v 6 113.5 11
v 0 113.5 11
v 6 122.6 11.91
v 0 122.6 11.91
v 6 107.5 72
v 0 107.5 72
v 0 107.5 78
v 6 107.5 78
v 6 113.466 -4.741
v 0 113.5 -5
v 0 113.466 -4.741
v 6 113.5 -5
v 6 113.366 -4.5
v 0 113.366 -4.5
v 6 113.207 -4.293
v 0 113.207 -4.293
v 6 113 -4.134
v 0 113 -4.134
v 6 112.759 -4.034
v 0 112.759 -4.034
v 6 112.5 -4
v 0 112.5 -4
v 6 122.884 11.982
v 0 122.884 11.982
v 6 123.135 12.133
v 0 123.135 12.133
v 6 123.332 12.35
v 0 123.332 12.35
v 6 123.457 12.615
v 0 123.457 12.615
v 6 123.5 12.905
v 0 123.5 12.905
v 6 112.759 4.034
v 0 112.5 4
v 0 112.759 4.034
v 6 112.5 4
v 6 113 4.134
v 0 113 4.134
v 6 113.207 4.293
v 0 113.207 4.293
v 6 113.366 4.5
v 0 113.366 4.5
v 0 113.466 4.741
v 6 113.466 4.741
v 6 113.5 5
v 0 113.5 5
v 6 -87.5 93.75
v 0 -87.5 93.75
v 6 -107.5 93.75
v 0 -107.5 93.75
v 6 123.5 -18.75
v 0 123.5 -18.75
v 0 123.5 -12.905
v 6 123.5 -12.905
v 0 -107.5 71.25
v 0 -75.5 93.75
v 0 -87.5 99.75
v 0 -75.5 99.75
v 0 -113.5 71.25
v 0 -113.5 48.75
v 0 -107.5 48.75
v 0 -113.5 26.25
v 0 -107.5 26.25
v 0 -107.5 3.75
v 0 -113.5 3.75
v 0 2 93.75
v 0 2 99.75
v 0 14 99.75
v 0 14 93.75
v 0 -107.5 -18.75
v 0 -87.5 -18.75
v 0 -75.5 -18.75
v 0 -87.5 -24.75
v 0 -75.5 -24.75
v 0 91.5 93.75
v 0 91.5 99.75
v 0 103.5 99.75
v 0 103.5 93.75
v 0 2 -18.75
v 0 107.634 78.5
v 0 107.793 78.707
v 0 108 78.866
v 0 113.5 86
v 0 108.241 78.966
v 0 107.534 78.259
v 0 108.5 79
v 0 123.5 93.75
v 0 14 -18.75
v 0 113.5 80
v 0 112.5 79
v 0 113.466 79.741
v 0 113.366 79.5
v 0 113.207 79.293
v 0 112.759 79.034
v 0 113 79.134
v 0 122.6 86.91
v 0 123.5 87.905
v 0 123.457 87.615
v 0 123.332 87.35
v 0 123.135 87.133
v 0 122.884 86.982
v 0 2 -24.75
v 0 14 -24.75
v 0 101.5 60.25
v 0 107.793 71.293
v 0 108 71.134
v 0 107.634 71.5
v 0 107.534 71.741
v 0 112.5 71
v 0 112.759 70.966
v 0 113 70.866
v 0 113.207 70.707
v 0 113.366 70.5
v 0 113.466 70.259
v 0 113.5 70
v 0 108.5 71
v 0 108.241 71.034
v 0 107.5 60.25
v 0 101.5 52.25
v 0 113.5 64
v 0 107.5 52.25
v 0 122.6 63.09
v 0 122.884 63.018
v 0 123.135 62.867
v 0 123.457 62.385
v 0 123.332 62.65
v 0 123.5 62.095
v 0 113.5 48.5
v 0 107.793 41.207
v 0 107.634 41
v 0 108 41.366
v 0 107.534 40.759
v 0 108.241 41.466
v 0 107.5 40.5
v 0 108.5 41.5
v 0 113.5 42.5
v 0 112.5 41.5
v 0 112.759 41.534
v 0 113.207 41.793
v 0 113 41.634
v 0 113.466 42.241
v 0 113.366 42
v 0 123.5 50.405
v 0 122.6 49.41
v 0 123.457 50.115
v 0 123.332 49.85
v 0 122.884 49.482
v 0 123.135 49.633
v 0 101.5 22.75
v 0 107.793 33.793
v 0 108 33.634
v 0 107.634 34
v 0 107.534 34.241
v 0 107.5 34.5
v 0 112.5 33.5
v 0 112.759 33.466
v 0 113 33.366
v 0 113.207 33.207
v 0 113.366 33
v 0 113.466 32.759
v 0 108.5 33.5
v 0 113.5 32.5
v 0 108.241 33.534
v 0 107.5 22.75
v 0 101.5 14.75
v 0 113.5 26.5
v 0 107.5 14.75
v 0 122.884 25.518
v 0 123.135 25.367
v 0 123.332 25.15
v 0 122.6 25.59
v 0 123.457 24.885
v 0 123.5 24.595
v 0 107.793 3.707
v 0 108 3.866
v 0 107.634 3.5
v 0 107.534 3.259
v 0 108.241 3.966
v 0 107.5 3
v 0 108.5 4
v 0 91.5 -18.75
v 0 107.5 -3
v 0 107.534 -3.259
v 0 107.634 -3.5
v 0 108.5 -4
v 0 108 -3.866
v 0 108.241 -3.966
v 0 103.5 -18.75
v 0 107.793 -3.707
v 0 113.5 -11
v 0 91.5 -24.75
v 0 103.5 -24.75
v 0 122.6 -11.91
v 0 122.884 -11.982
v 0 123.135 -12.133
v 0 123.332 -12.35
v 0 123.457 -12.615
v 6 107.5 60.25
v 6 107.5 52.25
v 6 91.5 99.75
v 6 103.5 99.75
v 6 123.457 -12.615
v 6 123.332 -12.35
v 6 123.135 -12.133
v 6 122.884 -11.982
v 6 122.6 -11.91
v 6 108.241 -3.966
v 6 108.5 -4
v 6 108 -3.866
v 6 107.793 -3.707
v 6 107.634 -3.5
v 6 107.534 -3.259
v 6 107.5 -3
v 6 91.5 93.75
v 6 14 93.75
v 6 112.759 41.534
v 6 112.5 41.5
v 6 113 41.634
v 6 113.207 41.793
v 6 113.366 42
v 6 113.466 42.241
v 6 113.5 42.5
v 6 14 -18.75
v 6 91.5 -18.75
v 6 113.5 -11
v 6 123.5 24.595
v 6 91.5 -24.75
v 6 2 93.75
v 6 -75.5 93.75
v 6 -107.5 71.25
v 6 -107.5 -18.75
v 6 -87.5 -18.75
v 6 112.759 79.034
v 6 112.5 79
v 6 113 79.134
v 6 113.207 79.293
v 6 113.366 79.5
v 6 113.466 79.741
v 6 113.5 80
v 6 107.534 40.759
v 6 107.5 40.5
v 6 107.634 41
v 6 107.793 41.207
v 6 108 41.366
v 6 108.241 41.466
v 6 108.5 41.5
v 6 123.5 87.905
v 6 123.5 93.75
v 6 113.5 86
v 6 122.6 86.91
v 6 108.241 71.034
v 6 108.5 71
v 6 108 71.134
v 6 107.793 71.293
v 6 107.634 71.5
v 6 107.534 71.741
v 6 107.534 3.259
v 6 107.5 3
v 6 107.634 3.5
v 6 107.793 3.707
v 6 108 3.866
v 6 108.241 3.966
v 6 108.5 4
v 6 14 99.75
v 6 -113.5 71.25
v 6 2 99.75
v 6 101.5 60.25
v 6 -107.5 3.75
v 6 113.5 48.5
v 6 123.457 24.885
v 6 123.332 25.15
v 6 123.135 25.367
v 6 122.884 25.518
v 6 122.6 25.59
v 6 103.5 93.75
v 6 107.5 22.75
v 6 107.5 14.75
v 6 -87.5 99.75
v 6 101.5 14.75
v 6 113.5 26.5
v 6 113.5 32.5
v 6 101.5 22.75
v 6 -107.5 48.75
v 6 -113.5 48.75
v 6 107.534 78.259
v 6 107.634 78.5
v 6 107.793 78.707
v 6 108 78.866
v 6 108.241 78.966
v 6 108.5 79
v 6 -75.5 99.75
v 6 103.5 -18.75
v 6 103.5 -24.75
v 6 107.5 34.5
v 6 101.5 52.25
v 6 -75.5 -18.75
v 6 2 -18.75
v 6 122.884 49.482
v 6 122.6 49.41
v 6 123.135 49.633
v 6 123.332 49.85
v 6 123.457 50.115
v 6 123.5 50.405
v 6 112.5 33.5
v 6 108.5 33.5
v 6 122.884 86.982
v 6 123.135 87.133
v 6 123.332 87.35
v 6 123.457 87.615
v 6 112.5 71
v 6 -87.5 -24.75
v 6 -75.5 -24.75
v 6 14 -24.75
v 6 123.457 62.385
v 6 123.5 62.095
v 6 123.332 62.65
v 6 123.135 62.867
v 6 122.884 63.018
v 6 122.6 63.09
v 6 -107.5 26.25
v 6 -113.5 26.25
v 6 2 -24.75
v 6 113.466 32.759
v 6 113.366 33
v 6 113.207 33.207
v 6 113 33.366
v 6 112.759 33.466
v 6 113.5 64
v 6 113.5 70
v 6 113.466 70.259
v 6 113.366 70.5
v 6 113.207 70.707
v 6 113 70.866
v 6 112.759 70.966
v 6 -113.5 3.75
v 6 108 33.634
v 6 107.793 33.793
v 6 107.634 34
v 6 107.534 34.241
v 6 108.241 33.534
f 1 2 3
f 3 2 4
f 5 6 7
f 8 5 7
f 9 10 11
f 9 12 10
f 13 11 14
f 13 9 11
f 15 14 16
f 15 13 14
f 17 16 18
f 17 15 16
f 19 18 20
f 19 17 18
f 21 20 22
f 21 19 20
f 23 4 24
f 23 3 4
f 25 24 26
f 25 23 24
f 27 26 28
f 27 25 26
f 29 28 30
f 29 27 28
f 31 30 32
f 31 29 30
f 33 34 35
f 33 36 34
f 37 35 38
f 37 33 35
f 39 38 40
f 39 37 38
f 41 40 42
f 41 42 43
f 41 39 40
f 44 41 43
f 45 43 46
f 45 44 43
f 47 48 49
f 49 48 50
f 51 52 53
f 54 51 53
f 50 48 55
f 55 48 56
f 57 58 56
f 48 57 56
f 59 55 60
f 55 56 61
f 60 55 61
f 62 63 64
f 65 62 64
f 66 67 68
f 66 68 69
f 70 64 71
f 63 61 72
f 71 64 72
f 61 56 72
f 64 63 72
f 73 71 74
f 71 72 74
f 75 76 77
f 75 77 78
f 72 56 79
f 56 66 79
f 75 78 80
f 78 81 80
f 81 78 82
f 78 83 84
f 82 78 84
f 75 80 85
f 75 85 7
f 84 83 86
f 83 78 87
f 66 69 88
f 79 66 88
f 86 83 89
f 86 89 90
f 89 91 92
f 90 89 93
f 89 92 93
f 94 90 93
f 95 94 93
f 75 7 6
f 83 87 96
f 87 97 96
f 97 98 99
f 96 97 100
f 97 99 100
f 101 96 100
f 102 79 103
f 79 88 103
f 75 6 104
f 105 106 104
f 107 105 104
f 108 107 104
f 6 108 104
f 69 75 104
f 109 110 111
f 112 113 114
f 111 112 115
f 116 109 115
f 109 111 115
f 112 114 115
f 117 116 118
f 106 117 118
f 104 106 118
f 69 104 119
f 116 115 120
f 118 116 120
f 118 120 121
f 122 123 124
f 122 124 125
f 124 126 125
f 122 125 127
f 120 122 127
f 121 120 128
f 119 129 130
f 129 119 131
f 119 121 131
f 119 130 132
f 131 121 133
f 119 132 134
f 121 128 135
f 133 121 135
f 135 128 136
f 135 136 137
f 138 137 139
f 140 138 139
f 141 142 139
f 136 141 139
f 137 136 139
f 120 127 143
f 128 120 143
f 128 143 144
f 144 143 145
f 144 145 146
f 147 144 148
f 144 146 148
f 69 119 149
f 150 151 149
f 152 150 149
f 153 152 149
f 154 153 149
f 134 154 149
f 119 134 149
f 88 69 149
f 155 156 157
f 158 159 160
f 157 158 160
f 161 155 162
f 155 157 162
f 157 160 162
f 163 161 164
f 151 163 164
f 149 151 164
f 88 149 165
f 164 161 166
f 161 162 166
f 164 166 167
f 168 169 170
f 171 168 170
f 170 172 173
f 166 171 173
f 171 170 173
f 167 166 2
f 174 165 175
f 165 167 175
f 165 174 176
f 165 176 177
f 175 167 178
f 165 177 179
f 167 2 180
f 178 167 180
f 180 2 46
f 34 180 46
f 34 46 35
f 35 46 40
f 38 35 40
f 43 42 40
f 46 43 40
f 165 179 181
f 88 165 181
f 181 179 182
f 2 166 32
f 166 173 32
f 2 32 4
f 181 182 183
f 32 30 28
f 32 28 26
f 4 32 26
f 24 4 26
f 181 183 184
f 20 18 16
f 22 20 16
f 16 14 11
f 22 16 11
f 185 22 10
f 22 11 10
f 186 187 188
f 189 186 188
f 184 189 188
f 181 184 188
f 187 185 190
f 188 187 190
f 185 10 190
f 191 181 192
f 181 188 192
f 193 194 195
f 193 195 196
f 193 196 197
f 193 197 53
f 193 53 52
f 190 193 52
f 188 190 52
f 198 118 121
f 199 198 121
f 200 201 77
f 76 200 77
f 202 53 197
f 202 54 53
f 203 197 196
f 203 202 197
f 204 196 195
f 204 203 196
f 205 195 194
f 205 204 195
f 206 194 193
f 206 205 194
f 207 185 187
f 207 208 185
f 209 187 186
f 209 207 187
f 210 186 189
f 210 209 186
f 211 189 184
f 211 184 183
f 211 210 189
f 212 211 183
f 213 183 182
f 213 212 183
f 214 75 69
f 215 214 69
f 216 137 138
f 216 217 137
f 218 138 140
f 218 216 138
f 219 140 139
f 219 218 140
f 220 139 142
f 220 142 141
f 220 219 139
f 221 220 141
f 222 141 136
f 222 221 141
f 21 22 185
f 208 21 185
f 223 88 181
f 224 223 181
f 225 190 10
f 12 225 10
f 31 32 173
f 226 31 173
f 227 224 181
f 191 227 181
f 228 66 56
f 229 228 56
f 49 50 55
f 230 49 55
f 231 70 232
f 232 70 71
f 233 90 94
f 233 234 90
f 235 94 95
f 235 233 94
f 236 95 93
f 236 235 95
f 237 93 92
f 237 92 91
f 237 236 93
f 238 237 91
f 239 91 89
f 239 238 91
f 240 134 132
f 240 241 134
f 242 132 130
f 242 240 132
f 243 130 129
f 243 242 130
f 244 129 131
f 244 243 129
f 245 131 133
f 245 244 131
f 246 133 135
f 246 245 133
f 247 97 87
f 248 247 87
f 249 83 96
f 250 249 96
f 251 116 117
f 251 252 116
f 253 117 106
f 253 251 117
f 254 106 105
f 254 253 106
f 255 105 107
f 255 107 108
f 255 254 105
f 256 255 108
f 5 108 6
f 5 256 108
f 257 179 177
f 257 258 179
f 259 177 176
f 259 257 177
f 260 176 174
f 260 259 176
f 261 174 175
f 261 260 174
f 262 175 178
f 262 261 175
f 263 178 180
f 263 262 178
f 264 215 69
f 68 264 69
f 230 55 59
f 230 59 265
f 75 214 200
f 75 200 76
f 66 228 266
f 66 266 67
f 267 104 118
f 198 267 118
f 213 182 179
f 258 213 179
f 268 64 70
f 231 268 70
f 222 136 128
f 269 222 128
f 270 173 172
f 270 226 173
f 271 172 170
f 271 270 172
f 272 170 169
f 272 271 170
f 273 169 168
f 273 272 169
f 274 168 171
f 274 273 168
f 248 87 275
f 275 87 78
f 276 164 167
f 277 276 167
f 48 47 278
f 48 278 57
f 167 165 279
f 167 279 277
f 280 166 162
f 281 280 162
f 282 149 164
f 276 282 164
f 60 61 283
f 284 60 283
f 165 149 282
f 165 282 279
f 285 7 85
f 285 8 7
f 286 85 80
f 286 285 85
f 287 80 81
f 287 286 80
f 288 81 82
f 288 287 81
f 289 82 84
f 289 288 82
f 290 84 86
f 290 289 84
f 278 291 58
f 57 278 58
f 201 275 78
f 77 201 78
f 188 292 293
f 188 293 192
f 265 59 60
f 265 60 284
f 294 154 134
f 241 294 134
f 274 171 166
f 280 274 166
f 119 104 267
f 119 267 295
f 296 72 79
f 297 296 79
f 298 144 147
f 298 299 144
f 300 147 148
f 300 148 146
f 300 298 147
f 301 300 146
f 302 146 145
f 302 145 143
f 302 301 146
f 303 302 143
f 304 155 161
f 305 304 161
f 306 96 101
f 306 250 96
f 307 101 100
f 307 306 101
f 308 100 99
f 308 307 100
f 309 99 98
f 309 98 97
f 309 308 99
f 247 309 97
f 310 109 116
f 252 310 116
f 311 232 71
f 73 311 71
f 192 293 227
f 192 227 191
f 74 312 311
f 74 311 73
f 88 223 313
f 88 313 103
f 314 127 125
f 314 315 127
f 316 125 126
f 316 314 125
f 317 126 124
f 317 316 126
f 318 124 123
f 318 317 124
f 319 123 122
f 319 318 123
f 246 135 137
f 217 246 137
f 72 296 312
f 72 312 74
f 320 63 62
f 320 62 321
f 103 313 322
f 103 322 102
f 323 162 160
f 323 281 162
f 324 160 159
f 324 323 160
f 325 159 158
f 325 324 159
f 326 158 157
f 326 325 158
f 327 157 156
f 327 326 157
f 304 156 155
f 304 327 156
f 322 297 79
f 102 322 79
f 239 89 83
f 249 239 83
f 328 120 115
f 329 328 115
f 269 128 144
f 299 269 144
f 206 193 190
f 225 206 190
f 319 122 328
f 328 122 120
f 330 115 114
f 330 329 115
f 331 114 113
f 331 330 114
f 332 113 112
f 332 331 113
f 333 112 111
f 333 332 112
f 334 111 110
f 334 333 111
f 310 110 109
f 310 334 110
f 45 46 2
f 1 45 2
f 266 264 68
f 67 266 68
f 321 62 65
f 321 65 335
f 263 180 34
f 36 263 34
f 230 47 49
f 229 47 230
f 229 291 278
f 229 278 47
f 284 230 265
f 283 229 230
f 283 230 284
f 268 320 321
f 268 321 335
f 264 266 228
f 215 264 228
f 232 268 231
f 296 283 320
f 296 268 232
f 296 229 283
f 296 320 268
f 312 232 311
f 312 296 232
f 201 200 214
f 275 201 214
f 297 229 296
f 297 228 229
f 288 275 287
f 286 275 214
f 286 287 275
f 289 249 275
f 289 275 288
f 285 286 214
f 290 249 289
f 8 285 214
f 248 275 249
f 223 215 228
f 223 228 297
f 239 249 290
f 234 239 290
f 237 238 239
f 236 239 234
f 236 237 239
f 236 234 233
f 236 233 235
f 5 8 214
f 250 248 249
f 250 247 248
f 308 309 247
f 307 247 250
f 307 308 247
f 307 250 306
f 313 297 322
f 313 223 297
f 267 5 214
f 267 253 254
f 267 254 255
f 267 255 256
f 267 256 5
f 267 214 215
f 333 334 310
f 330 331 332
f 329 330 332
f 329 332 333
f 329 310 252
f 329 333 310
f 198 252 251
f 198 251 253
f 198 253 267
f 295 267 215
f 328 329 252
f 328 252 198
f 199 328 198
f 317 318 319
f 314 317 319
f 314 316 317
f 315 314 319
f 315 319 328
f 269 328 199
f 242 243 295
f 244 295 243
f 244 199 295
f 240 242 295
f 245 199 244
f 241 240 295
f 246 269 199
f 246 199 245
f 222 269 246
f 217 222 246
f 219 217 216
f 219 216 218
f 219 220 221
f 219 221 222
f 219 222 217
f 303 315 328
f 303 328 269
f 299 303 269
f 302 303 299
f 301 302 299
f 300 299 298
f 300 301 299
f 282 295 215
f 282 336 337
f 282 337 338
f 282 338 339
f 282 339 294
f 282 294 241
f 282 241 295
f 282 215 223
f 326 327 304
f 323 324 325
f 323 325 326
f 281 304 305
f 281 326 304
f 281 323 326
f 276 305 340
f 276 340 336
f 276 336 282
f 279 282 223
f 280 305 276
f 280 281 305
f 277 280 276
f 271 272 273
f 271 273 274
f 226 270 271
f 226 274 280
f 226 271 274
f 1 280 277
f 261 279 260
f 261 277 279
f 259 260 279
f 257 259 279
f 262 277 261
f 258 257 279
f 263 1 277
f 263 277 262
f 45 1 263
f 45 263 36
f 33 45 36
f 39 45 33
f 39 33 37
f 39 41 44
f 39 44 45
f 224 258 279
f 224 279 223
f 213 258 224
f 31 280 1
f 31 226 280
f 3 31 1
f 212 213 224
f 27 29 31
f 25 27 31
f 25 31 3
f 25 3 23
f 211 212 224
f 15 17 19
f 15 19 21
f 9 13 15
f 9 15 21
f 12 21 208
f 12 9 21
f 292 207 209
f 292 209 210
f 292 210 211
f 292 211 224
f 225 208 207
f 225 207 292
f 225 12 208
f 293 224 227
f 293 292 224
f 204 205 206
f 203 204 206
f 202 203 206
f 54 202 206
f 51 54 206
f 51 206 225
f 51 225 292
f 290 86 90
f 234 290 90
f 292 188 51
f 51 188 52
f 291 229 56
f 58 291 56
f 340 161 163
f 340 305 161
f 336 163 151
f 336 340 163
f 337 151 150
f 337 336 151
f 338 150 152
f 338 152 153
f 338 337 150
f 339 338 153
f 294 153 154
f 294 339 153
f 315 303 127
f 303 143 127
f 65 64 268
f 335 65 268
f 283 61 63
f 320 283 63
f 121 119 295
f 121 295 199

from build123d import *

# Parameters (mm, degrees)
BOSS_EXTRUDE2_DEPTH    = 6
FILLET1_R              = 1
LPATTERN1_COUNT        = 3
LPATTERN1_PITCH        = 37.5
FILLET1_OF_LPATTERN1_R = 1
SKETCH3_W              = 6
SKETCH3_H              = 12
BOSS_EXTRUDE3_DEPTH    = 6
SKETCH4_W              = 8
SKETCH4_H              = 6
CUT_EXTRUDE2_DEPTH     = 7
LPATTERN2_COUNT        = 2
LPATTERN2_PITCH        = 37.5
BOSS_EXTRUDE4_START    = -112.5
SKETCH3_2_W            = 6
SKETCH3_2_H            = 12
BOSS_EXTRUDE4_DEPTH    = 6
SKETCH5_W              = 6
SKETCH5_H              = 22.5
BOSS_EXTRUDE5_DEPTH    = 6


with BuildPart() as part:
    # Sketch2 → Boss-Extrude2 (new body)
    with BuildSketch(Plane(origin=(0, 0, 0), x_dir=(0, 0, -1), z_dir=(1, 0, 0))):
        Polygon((-18.75, 123.5), (-18.75, 107.5), (-18.75, -107.5), (18.75, -107.5), (18.75, 107.5), (18.75, 123.5), (12, 123.5), (11, 113.5), (4, 113.5), (4, 107.5), (-4, 107.5), (-4, 113.5), (-11, 113.5), (-12, 123.5), align=None)
    boss_extrude2 = extrude(amount=BOSS_EXTRUDE2_DEPTH)

    # Fillet1
    fillet1_edges = [part.edges().sort_by_distance(p)[0] for p in [
        (3, 113.5, -4),
        (3, 123.5, -12),
        (3, 123.5, 12),
        (3, 113.5, 4),
        (3, 107.5, 4),
        (3, 107.5, -4),
    ]]
    fillet(fillet1_edges, radius=FILLET1_R)

    # LPattern1: Boss-Extrude2 ×3
    with Locations(*[(0, 0, i * LPATTERN1_PITCH) for i in range(1, LPATTERN1_COUNT)]):
        add(boss_extrude2)

    # Fillet1 of LPattern1
    fillet1_of_lpattern1_edges = [part.edges().sort_by_distance(p)[0] for p in [
        (3, 113.5, 33.5),
        (3, 123.5, 25.5),
        (3, 123.5, 49.5),
        (3, 113.5, 41.5),
        (3, 107.5, 41.5),
        (3, 107.5, 33.5),
        (3, 113.5, 71),
        (3, 123.5, 63),
        (3, 123.5, 87),
        (3, 113.5, 79),
        (3, 107.5, 79),
        (3, 107.5, 71),
    ]]
    fillet(fillet1_of_lpattern1_edges, radius=FILLET1_OF_LPATTERN1_R)

    # Sketch3 → Boss-Extrude3 (add)
    with BuildSketch(Plane(origin=(0, 0, -18.75), x_dir=(-1, 0, 0), z_dir=(0, 0, -1))):
        with Locations((-3, 97.5)):
            Rectangle(SKETCH3_W, SKETCH3_H)
        with Locations((-3, -81.5)):
            Rectangle(SKETCH3_W, SKETCH3_H)
        with Locations((-3, 8)):
            Rectangle(SKETCH3_W, SKETCH3_H)
    extrude(amount=BOSS_EXTRUDE3_DEPTH)

    # Sketch4 → Cut-Extrude2 (cut, through all)
    with BuildSketch(Plane(origin=(0, 0, 0), x_dir=(0, 0, -1), z_dir=(1, 0, 0))):
        with Locations((-18.75, 104.5)):
            Rectangle(SKETCH4_W, SKETCH4_H)
    cut_extrude2 = extrude(amount=CUT_EXTRUDE2_DEPTH, mode=Mode.SUBTRACT)

    # LPattern2: Cut-Extrude2 ×2
    with Locations(*[(0, 0, i * LPATTERN2_PITCH) for i in range(1, LPATTERN2_COUNT)]):
        add(cut_extrude2, mode=Mode.SUBTRACT)

    # Sketch3_2 → Boss-Extrude4 (add)
    with BuildSketch(Plane(origin=(0, 0, -18.75), x_dir=(-1, 0, 0), z_dir=(0, 0, -1)).offset(BOSS_EXTRUDE4_START)):
        with Locations((-3, 97.5)):
            Rectangle(SKETCH3_2_W, SKETCH3_2_H)
        with Locations((-3, -81.5)):
            Rectangle(SKETCH3_2_W, SKETCH3_2_H)
        with Locations((-3, 8)):
            Rectangle(SKETCH3_2_W, SKETCH3_2_H)
    extrude(amount=-BOSS_EXTRUDE4_DEPTH)

    # Sketch5 → Boss-Extrude5 (add)
    with BuildSketch(Plane.XZ.offset(107.5)):
        with Locations((3, 15)):
            Rectangle(SKETCH5_W, SKETCH5_H)
        with Locations((3, 60)):
            Rectangle(SKETCH5_W, SKETCH5_H)
    extrude(amount=BOSS_EXTRUDE5_DEPTH)


solid = part.part
